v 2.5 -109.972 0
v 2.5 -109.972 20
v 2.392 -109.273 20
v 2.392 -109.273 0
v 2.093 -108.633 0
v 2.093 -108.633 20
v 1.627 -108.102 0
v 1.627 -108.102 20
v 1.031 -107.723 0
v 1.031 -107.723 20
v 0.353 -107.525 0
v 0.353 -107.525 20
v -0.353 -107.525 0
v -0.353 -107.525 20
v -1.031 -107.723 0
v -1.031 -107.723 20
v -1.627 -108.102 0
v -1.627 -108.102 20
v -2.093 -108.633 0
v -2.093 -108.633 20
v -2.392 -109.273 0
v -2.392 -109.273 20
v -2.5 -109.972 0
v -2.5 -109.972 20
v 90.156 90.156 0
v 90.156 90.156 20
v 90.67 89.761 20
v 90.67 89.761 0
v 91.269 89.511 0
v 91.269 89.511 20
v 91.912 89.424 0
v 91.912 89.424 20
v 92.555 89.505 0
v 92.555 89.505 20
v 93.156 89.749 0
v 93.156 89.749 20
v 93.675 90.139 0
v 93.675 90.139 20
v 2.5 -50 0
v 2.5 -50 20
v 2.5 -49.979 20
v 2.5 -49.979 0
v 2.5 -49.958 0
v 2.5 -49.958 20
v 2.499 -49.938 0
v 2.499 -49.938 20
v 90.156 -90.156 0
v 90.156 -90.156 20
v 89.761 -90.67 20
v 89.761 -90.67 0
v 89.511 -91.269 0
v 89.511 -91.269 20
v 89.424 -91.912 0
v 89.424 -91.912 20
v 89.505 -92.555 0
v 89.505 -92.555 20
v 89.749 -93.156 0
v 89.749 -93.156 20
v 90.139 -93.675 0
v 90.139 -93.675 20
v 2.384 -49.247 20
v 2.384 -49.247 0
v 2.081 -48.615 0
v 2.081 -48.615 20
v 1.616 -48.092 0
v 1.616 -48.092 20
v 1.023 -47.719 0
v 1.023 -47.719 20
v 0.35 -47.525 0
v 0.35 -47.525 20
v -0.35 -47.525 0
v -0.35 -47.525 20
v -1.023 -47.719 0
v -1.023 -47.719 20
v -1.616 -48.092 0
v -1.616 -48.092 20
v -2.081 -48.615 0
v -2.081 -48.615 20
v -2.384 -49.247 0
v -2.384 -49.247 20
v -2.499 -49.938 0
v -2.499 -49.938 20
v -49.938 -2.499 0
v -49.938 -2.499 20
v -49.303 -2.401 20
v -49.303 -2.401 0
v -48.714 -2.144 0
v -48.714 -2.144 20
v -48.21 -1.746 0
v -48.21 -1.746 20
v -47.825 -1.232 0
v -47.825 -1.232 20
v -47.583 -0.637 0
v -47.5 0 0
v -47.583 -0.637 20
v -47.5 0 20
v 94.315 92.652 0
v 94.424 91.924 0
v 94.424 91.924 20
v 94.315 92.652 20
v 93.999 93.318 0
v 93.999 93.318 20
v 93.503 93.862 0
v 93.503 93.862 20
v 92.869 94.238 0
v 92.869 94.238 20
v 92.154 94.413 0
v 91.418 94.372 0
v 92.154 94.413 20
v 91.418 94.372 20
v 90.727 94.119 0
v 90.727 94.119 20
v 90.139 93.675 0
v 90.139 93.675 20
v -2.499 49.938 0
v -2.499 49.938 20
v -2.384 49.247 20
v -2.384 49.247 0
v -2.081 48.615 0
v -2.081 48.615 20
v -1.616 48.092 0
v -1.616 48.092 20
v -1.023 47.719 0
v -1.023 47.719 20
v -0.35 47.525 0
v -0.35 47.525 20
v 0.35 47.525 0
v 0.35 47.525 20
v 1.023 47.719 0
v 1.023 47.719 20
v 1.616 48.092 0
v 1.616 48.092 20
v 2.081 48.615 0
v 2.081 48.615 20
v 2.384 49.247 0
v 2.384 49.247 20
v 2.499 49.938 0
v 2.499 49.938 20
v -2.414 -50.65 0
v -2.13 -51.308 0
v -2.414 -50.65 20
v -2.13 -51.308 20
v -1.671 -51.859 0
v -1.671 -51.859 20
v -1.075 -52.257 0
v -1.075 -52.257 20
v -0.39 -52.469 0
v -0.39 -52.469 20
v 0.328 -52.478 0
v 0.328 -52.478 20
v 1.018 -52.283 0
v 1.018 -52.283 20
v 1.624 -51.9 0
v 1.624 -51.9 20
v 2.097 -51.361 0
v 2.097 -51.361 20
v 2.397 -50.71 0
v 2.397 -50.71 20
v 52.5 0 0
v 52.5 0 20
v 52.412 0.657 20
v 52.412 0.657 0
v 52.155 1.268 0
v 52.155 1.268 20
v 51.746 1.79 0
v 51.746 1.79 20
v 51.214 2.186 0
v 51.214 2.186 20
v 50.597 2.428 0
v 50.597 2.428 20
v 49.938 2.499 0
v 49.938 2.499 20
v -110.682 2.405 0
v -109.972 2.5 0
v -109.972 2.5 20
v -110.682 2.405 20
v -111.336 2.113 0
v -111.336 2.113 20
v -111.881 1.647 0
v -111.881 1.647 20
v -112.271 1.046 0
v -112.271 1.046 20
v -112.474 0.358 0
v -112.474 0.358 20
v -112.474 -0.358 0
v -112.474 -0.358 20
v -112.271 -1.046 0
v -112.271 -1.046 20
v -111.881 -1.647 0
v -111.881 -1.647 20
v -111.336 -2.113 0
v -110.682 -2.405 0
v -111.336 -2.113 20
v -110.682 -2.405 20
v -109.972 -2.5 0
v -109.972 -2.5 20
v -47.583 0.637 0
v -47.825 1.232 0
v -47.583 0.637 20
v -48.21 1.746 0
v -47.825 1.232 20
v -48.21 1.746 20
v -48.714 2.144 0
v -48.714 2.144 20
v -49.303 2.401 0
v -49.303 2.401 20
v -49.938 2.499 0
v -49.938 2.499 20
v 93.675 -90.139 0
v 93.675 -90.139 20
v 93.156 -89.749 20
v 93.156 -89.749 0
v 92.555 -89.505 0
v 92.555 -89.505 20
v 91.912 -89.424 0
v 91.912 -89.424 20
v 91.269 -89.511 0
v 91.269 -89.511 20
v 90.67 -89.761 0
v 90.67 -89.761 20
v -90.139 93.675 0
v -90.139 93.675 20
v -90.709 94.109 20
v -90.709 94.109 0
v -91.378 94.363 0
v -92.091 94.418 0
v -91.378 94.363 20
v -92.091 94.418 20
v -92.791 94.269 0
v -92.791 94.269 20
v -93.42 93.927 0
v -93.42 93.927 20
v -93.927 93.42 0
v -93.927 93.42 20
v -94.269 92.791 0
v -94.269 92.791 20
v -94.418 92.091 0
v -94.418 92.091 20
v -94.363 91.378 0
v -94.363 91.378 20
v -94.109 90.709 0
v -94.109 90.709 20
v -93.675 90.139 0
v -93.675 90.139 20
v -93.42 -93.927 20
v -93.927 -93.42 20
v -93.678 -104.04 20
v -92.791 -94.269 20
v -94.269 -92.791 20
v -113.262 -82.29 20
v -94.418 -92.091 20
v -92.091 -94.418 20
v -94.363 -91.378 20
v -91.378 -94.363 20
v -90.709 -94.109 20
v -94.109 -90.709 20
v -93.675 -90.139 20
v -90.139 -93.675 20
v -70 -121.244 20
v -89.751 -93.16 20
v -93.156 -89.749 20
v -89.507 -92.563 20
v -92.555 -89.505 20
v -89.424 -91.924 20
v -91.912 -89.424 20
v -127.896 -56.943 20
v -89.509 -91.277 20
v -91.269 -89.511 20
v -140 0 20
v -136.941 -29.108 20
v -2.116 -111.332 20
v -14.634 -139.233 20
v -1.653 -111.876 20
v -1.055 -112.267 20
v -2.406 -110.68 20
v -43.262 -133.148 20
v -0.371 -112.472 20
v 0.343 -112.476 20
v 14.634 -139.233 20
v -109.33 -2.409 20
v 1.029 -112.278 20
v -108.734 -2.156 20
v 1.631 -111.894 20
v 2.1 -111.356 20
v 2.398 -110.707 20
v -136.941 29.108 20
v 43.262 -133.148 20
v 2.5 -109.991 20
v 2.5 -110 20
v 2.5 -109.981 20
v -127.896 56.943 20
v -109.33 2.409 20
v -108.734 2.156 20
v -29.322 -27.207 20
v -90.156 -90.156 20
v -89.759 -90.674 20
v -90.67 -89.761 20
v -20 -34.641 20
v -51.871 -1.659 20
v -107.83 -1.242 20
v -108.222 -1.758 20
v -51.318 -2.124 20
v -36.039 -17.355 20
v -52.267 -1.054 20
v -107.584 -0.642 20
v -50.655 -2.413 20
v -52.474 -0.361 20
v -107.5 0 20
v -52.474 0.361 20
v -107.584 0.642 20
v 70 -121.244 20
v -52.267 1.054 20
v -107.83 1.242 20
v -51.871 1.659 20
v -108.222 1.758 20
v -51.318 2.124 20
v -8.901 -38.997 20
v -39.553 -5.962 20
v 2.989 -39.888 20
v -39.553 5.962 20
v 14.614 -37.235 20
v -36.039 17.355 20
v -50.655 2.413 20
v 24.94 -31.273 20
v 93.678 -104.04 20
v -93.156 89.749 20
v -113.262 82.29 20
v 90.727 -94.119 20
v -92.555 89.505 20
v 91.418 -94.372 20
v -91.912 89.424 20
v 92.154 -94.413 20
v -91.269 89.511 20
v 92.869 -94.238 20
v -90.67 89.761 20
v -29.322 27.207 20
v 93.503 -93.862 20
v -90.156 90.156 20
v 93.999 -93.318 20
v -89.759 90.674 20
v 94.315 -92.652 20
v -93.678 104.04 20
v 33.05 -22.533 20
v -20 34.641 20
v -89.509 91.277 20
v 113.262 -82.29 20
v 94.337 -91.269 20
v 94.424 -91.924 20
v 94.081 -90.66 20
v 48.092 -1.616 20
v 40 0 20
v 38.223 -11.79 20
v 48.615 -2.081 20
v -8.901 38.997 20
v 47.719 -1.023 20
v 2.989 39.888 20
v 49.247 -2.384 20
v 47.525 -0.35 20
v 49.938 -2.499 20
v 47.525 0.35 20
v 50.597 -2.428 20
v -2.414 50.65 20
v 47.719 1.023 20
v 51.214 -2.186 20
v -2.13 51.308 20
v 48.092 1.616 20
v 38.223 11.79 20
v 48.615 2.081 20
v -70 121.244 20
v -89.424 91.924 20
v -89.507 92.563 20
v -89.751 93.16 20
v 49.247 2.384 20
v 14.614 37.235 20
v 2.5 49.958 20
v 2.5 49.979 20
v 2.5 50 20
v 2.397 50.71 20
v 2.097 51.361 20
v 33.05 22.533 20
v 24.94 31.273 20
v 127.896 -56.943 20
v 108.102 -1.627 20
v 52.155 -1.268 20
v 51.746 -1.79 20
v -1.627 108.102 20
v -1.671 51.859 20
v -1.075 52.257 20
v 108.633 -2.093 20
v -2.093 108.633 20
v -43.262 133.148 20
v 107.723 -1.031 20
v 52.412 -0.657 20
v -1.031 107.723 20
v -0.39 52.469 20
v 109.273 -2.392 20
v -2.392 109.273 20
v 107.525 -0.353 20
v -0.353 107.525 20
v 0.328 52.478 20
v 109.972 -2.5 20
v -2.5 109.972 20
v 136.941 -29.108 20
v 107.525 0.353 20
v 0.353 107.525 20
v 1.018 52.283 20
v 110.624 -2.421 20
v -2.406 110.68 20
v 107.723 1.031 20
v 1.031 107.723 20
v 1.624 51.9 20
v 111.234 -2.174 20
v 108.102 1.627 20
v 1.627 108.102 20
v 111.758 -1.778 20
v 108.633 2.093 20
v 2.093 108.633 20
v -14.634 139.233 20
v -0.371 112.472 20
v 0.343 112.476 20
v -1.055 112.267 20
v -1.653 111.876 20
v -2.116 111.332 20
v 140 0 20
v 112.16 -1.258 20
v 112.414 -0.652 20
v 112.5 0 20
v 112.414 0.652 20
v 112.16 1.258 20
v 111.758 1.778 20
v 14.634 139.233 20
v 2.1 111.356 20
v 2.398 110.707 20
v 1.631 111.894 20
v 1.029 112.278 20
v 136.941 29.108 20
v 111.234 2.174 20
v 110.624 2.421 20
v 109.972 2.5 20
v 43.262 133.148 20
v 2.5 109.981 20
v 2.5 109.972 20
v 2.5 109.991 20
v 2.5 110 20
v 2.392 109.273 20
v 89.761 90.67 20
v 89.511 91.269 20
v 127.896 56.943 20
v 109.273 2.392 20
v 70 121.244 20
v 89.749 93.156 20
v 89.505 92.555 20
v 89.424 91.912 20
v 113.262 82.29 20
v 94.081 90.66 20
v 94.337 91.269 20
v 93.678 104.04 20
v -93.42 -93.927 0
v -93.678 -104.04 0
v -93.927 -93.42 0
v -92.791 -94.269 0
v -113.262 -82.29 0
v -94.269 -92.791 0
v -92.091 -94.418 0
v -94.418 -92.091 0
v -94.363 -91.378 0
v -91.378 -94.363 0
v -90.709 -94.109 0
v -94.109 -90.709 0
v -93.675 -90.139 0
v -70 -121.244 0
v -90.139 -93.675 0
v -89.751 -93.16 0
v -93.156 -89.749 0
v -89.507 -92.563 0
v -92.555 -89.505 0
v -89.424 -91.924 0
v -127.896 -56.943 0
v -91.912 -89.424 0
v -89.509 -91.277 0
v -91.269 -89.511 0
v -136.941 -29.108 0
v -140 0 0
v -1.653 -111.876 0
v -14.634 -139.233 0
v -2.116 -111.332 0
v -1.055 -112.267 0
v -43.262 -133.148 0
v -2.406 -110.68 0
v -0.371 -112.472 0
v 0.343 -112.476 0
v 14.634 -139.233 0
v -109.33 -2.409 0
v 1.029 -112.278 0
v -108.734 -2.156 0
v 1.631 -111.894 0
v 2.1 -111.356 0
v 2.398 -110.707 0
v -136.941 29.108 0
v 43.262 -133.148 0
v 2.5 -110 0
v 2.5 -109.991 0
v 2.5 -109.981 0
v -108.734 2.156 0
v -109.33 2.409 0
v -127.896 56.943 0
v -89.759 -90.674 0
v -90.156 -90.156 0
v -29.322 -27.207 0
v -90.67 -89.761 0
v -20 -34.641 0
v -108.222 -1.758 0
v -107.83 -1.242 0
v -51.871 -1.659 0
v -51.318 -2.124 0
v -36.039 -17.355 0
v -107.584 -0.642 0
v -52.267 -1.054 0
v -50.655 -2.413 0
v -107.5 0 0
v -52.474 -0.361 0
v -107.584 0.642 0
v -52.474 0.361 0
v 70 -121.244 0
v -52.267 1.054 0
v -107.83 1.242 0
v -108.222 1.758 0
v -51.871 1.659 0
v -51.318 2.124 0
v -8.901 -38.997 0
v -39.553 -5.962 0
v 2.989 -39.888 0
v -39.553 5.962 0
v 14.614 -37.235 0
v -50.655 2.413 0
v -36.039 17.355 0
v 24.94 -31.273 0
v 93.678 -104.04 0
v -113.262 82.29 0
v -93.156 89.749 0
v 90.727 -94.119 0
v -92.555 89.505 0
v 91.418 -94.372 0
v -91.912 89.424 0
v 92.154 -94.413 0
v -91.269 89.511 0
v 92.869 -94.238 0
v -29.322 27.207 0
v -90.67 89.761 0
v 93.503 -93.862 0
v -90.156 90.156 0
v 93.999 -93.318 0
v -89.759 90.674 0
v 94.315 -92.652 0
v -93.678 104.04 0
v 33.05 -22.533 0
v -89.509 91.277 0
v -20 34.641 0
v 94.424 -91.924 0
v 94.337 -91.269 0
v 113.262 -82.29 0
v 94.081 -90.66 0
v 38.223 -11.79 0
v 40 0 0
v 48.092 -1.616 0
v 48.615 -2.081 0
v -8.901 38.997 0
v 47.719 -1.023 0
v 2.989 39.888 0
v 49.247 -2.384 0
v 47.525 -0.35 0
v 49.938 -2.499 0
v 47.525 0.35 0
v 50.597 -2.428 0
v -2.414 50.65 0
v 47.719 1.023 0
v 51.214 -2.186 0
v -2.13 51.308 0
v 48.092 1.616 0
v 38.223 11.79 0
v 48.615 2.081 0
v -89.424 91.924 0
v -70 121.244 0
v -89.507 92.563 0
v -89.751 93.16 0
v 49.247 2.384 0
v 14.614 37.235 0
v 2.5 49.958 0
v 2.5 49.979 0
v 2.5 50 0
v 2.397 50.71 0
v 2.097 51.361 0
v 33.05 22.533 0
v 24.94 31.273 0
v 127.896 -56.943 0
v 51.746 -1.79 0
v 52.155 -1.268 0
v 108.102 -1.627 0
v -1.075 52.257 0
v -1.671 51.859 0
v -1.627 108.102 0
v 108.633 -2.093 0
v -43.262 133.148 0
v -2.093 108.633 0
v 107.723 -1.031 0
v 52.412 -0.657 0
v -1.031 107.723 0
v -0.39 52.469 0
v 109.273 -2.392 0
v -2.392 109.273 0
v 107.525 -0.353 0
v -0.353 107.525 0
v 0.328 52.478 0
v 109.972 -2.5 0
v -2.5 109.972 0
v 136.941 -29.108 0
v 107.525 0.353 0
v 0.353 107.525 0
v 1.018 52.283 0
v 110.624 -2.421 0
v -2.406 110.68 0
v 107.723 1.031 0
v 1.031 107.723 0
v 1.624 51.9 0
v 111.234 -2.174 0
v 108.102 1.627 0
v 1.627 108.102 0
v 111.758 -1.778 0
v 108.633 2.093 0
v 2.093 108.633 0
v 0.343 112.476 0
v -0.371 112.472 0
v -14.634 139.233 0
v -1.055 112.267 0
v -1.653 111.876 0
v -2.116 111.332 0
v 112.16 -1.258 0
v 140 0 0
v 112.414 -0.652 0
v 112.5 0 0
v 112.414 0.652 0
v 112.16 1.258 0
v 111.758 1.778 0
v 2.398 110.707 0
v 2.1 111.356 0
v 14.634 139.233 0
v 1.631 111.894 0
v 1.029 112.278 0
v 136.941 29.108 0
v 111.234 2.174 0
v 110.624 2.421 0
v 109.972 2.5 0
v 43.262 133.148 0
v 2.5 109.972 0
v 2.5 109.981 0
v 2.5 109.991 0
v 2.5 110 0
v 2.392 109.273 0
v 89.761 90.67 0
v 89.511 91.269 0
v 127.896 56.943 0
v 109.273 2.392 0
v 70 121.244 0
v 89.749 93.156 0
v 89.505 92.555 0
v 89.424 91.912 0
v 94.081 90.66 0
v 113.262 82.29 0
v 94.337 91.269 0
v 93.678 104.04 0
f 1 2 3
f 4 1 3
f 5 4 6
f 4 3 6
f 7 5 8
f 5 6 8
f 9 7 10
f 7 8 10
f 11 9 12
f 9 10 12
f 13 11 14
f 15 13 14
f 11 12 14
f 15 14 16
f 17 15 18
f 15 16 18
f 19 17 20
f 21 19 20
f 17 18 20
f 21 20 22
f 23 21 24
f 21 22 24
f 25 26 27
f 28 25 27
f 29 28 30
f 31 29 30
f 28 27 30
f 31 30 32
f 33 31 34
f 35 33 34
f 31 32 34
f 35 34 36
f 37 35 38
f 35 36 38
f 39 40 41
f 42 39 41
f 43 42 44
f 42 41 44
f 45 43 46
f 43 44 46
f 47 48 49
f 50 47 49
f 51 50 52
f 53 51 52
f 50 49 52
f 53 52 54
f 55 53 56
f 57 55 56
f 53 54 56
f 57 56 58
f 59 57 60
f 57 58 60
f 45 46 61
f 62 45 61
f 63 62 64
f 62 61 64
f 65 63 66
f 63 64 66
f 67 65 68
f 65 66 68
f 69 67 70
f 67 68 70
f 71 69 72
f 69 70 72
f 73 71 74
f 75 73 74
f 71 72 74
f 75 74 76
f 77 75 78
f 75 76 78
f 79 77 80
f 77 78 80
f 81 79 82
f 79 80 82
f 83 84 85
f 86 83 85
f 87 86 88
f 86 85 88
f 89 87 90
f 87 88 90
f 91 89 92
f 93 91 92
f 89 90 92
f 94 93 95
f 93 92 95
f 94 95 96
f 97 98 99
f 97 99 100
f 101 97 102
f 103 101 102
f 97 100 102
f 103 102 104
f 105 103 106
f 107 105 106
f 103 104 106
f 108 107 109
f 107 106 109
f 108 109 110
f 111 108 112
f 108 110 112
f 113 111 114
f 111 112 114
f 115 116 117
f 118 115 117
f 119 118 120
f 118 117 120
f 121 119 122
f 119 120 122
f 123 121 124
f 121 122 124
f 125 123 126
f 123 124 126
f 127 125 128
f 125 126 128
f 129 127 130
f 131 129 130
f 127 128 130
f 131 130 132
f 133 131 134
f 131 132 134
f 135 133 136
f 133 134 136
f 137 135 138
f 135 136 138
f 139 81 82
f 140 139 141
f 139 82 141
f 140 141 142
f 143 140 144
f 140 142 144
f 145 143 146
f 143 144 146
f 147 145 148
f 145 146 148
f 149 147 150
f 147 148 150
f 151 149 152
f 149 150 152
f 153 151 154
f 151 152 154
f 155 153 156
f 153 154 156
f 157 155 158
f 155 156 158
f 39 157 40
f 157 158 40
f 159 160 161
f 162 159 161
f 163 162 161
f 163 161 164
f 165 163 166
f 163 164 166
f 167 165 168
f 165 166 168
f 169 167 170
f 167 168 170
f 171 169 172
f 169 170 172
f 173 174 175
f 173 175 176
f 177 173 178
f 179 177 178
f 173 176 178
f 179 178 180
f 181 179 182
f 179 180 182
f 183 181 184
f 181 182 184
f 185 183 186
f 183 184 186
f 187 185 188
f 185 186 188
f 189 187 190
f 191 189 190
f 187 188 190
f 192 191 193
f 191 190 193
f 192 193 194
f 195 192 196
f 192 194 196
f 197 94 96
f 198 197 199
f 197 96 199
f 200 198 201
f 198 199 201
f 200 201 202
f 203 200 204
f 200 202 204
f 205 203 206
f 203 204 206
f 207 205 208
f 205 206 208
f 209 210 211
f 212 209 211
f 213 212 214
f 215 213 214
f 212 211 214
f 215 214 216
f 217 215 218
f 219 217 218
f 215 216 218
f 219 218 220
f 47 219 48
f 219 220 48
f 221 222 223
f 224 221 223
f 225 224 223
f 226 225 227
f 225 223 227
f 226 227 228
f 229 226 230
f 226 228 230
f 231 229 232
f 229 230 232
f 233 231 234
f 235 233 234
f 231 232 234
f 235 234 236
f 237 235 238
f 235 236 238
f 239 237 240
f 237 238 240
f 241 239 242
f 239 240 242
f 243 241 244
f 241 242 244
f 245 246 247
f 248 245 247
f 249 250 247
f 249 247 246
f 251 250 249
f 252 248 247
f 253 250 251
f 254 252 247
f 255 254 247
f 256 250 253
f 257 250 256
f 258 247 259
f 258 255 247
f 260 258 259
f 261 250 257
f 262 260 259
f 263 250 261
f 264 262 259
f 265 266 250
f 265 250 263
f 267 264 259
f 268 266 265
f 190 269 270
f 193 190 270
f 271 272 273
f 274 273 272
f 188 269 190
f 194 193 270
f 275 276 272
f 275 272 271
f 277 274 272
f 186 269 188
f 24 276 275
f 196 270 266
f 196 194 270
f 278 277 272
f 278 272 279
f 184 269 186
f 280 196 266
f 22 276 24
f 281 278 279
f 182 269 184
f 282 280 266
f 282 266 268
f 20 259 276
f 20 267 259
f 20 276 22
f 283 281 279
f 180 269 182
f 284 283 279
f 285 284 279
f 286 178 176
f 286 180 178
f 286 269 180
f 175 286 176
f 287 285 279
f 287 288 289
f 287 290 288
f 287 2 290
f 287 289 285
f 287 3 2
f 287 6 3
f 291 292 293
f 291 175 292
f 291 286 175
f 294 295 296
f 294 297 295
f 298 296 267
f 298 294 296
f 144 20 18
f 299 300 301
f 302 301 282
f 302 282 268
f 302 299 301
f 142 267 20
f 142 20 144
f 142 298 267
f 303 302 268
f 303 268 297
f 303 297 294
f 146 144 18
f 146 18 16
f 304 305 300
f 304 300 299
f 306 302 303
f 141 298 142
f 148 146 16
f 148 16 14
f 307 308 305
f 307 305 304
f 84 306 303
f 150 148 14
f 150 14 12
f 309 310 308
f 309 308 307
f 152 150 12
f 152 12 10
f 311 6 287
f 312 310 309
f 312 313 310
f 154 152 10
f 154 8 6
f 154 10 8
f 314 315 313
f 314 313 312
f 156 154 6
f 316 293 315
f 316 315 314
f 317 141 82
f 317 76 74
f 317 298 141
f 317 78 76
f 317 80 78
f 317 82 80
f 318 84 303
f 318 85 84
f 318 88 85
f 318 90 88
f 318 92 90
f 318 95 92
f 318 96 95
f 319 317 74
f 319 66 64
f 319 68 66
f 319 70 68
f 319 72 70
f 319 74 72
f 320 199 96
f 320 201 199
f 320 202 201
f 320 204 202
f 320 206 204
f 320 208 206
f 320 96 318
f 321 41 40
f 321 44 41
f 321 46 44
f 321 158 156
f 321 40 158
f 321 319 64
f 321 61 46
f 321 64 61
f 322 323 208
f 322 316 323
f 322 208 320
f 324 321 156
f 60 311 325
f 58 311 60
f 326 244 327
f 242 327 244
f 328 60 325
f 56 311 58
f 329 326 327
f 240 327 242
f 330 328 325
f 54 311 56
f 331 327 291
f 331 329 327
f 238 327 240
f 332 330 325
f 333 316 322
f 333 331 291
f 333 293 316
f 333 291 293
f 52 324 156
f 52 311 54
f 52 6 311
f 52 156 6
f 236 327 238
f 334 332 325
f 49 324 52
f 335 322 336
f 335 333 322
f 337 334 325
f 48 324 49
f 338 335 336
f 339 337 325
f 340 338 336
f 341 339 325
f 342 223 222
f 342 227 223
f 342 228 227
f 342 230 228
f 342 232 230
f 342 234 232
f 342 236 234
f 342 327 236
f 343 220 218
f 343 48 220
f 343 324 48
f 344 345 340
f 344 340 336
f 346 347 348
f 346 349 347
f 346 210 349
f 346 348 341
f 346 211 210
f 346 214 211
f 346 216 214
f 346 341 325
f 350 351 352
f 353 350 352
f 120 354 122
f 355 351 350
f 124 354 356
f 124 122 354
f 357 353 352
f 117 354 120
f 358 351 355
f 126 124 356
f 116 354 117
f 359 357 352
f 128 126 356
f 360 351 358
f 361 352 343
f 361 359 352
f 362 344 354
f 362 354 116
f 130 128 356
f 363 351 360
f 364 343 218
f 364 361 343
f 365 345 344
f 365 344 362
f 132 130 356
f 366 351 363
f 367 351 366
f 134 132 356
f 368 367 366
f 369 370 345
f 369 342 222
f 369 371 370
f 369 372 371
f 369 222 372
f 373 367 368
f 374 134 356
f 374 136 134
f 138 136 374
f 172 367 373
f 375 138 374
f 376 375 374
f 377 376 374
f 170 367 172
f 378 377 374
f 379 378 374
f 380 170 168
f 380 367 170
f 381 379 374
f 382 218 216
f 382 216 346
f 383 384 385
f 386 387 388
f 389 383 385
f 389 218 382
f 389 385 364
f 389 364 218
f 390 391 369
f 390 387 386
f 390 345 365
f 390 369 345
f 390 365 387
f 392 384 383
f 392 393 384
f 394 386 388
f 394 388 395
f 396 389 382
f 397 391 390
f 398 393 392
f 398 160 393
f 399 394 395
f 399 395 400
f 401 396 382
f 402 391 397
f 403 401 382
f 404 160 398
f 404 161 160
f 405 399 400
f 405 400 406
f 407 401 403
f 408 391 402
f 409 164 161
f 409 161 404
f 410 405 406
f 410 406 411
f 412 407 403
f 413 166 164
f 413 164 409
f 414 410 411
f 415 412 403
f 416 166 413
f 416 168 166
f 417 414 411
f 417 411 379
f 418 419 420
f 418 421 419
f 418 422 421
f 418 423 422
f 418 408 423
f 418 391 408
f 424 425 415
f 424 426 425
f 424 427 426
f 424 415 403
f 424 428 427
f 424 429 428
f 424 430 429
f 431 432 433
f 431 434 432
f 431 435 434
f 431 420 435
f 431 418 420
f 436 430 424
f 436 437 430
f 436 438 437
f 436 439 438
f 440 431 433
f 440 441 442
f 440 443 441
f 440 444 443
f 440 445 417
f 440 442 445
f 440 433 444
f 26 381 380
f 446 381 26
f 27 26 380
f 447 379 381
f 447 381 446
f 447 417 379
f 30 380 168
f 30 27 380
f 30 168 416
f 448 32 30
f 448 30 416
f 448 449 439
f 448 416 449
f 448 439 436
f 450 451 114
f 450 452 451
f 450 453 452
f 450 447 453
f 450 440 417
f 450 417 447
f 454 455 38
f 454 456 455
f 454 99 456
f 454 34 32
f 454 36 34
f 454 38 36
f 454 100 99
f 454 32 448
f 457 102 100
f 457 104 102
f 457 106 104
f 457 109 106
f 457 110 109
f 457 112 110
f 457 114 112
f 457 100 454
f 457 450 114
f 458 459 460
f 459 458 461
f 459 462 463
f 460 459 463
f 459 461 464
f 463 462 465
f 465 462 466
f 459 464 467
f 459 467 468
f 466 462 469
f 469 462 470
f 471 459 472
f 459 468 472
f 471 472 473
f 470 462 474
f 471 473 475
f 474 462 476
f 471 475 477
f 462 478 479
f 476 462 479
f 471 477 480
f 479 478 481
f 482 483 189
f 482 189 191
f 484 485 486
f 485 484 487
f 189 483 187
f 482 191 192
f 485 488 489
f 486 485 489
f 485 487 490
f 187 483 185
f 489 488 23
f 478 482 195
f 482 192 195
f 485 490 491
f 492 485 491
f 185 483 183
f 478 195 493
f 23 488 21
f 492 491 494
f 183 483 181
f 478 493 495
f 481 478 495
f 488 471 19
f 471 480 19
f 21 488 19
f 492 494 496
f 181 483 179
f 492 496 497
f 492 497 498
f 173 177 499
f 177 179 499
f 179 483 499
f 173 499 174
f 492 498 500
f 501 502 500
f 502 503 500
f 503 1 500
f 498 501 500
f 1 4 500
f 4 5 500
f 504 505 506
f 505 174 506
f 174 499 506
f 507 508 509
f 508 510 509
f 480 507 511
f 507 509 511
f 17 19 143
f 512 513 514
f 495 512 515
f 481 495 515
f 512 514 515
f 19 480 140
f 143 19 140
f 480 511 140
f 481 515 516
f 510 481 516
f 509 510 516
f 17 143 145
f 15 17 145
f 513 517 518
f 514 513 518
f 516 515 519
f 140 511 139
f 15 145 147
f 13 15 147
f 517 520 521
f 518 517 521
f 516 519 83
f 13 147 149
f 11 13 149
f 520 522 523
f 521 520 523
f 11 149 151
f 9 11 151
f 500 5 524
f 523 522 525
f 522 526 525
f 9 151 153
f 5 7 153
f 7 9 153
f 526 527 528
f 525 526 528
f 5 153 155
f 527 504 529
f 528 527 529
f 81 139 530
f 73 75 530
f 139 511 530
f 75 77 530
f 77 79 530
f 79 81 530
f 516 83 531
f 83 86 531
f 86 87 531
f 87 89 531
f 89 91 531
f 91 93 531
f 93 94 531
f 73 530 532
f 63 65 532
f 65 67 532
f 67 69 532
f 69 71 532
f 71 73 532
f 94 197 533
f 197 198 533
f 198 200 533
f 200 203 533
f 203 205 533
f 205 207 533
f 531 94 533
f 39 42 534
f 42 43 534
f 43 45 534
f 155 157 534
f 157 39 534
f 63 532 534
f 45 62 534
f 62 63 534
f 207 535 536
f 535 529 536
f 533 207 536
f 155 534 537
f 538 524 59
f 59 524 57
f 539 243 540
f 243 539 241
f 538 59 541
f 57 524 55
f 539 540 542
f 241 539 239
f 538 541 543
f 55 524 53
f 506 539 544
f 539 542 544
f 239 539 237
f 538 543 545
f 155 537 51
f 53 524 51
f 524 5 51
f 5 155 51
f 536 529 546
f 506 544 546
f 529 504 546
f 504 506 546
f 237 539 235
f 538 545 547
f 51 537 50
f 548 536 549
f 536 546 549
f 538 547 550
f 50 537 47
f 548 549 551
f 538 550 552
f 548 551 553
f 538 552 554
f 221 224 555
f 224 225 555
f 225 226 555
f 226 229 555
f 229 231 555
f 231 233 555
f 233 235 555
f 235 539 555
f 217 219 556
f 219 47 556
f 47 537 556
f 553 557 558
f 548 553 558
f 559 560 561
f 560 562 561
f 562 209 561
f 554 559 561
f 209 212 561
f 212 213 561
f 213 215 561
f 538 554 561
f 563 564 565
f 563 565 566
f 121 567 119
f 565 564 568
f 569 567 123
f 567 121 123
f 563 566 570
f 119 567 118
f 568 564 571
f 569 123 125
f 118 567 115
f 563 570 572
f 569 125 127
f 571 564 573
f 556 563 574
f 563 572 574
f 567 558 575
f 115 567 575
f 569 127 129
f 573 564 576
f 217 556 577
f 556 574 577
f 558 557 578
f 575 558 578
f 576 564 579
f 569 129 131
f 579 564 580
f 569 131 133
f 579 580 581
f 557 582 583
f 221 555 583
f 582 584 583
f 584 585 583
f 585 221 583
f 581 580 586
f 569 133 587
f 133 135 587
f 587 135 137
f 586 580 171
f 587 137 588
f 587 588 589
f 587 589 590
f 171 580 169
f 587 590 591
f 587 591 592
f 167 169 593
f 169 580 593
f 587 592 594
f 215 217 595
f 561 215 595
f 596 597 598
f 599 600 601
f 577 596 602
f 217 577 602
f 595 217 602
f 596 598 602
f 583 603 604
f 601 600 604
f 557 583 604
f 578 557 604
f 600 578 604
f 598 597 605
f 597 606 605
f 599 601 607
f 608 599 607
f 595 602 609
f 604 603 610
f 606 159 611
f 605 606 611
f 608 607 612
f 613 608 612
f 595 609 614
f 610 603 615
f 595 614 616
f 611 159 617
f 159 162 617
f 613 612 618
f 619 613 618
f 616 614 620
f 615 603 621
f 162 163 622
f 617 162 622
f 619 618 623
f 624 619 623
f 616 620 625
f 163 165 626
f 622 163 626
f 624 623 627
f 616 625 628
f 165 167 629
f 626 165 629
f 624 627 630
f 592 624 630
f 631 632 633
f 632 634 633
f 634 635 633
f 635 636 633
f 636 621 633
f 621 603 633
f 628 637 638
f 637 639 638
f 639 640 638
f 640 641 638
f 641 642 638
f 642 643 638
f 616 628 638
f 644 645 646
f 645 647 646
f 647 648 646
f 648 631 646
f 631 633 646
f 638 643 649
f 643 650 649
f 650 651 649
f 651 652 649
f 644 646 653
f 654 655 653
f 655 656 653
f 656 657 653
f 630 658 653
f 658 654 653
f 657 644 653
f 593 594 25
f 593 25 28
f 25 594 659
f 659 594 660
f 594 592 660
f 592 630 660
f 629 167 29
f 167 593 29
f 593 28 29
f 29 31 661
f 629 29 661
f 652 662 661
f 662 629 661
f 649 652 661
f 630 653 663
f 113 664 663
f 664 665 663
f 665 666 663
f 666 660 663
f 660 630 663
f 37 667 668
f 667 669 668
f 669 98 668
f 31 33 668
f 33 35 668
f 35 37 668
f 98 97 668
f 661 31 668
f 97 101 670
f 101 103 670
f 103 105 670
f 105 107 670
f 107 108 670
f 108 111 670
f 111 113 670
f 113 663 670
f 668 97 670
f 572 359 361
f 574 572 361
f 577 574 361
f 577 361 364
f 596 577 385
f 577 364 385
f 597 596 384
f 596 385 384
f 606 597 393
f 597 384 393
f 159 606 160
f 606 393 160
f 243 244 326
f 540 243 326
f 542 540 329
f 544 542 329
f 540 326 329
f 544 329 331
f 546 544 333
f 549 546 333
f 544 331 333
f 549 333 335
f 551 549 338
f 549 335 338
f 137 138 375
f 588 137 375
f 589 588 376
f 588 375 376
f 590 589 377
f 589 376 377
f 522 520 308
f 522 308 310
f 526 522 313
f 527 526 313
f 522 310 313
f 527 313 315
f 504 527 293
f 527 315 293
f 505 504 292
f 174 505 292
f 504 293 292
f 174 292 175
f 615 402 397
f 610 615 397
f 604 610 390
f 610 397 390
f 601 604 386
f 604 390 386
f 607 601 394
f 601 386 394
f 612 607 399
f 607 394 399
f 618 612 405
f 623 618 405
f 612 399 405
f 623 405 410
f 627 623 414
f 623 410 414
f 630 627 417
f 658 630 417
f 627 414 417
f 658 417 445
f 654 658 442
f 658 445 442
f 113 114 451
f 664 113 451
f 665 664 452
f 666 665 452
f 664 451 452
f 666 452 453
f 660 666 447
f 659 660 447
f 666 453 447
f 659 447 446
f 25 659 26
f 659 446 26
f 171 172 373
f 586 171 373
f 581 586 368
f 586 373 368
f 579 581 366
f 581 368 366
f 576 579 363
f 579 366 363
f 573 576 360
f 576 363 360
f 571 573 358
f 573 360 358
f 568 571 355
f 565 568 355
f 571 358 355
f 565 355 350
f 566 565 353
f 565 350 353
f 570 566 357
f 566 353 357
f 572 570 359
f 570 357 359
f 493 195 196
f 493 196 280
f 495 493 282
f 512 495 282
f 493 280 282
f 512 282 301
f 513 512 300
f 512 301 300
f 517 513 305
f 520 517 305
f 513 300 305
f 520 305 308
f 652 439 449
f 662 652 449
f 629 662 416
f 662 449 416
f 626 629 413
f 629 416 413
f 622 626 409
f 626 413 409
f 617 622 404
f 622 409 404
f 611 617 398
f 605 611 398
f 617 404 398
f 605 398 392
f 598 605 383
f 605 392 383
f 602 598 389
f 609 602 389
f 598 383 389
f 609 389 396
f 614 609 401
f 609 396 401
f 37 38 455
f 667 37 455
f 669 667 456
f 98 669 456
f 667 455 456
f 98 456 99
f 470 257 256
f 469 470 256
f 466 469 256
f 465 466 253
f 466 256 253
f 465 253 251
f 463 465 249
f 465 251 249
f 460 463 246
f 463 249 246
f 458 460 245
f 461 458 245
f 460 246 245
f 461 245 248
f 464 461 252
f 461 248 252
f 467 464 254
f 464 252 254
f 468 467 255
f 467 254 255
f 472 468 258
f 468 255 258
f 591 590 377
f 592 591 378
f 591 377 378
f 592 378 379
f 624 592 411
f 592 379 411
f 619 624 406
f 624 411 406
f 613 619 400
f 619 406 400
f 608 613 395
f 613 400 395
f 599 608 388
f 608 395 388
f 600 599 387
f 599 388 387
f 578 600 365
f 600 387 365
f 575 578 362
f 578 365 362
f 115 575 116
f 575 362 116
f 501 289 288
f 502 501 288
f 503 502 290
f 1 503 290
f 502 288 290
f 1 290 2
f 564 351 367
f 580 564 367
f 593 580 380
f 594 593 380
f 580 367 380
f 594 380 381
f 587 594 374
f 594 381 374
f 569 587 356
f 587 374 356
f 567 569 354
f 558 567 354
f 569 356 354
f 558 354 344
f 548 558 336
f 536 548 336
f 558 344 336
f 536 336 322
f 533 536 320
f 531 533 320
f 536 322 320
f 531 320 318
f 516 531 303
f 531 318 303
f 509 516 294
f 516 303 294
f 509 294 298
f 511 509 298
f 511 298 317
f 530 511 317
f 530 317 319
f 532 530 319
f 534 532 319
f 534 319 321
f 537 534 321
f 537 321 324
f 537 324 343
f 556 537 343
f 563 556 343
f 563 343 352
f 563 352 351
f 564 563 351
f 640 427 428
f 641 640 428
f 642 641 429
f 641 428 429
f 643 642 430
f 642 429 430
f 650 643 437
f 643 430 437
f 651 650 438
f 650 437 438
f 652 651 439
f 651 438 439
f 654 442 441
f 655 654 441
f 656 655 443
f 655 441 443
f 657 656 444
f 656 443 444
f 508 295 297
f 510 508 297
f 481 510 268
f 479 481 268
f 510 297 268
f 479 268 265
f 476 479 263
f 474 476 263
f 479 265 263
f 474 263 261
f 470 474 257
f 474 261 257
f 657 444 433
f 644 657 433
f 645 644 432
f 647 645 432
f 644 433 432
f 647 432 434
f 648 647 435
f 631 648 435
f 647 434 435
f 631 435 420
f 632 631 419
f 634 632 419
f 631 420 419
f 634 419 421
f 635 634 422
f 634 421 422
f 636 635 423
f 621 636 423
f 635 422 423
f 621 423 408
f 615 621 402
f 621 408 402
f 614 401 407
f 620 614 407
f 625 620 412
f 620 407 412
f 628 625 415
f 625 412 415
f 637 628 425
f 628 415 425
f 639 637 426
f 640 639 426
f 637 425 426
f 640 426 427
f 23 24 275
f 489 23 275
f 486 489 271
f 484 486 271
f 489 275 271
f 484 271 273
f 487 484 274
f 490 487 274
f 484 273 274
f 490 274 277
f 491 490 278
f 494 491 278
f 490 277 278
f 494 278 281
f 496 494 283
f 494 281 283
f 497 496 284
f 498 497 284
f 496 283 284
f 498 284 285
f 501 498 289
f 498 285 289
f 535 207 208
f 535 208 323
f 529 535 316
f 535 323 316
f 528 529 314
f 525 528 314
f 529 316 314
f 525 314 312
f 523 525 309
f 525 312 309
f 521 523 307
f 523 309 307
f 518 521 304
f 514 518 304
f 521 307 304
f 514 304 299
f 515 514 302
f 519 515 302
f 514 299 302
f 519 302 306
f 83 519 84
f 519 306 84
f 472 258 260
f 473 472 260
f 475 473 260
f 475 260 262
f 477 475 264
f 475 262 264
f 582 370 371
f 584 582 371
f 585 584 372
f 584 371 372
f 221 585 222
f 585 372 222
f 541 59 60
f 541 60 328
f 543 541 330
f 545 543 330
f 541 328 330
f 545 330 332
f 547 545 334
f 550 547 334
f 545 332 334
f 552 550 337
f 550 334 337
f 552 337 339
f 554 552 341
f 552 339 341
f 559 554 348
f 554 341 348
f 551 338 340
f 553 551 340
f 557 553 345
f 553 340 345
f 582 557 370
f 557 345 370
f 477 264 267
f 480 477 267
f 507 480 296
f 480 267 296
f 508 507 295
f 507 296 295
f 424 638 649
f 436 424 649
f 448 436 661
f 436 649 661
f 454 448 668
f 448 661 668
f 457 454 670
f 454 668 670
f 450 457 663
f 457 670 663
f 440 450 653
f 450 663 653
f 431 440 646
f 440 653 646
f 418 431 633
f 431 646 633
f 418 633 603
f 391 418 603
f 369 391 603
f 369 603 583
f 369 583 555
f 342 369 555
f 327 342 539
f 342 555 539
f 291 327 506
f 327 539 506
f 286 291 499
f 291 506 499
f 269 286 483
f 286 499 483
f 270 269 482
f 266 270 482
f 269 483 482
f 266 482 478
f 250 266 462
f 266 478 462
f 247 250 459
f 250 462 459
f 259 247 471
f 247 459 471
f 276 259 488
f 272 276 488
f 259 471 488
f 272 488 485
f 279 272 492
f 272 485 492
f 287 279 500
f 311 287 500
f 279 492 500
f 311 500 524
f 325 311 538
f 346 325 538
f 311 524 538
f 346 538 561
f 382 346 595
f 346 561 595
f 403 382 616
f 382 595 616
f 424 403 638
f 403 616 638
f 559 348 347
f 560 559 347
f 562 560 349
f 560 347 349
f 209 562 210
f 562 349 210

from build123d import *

# Parameters (mm, degrees)
F0_R     = 140
F1_DEPTH = 20
F3_DEPTH = 20.001
F5_DEPTH = 25
F6_R     = 40
F7_DEPTH = 25
F9_DEPTH = 25


with BuildPart() as f1:
    # F0 (on Top) → F1 (new body)
    with BuildSketch(Plane.XY):
        Circle(F0_R)
    extrude(amount=F1_DEPTH)

    # F2 (on face) → F3 (cut, through all)
    with BuildSketch(Plane.XY.offset(20)):
        with BuildLine():
            ThreePointArc((-2.4998385795, 109.9715909091), (0, 110), (2.4998385795, 109.9715909091))
            ThreePointArc((2.4998385795, 109.9715909091), (2.4999596445, 109.9857952252), (2.5, 110))
            ThreePointArc((2.5, 110), (-0.0142047748, 112.4999596445), (-2.4998385795, 109.9715909091))
        make_face()
        with BuildLine():
            ThreePointArc((-2.4998385795, 109.9715909091), (0, 107.5), (2.4998385795, 109.9715909091))
            ThreePointArc((2.4998385795, 109.9715909091), (0, 110), (-2.4998385795, 109.9715909091))
        make_face()
        with BuildLine():
            ThreePointArc((109.9715909091, 2.4998385795), (109.992897498, 1.25), (110, 0))
            ThreePointArc((110, 0), (109.992897498, -1.25), (109.9715909091, -2.4998385795))
            ThreePointArc((109.9715909091, -2.4998385795), (111.7576941248, -1.7777827099), (112.5, 0))
            ThreePointArc((112.5, 0), (111.7576941248, 1.7777827099), (109.9715909091, 2.4998385795))
        make_face()
        with BuildLine():
            ThreePointArc((109.9715909091, -2.4998385795), (109.992897498, -1.25), (110, 0))
            ThreePointArc((110, 0), (109.992897498, 1.25), (109.9715909091, 2.4998385795))
            ThreePointArc((109.9715909091, 2.4998385795), (107.5, 0), (109.9715909091, -2.4998385795))
        make_face()
        with BuildLine():
            ThreePointArc((2.5, -110), (2.4999596445, -109.9857952252), (2.4998385795, -109.9715909091))
            ThreePointArc((2.4998385795, -109.9715909091), (0, -110), (-2.4998385795, -109.9715909091))
            ThreePointArc((-2.4998385795, -109.9715909091), (-0.0142047748, -112.4999596445), (2.5, -110))
        make_face()
        with BuildLine():
            ThreePointArc((-2.4998385795, -109.9715909091), (0, -110), (2.4998385795, -109.9715909091))
            ThreePointArc((2.4998385795, -109.9715909091), (0, -107.5), (-2.4998385795, -109.9715909091))
        make_face()
        with BuildLine():
            ThreePointArc((-107.5, 0), (-108.2222172901, 1.7576941248), (-109.9715909091, 2.4998385795))
            ThreePointArc((-109.9715909091, 2.4998385795), (-110, 0), (-109.9715909091, -2.4998385795))
            ThreePointArc((-109.9715909091, -2.4998385795), (-108.2222172901, -1.7576941248), (-107.5, 0))
        make_face()
        with BuildLine():
            ThreePointArc((-109.9715909091, -2.4998385795), (-110, 0), (-109.9715909091, 2.4998385795))
            ThreePointArc((-109.9715909091, 2.4998385795), (-112.5, 0), (-109.9715909091, -2.4998385795))
        make_face()
    extrude(amount=-F3_DEPTH, mode=Mode.SUBTRACT)

    # F4 (on face) → F5 (cut)
    with BuildSketch(Plane.XY.offset(20)):
        with BuildLine():
            ThreePointArc((-89.4238815543, 91.9238815543), (-89.6096098032, 92.8694746286), (-90.139198564, 93.6745690262))
            ThreePointArc((-90.139198564, 93.6745690262), (-91.0357485398, 92.8035154927), (-91.9238815543, 91.9238815543))
            Line((-91.9238815543, 91.9238815543), (-90.1561146013, 90.1561146013))
            ThreePointArc((-90.1561146013, 90.1561146013), (-89.614182723, 90.9671729733), (-89.4238815543, 91.9238815543))
        make_face()
        with BuildLine():
            ThreePointArc((-93.6745690262, 90.139198564), (-91.9118621846, 89.4239104475), (-90.1561146013, 90.1561146013))
            Line((-90.1561146013, 90.1561146013), (-91.9238815543, 91.9238815543))
            ThreePointArc((-91.9238815543, 91.9238815543), (-92.8035154927, 91.0357485398), (-93.6745690262, 90.139198564))
        make_face()
        with BuildLine():
            ThreePointArc((-91.9238815543, 91.9238815543), (-91.0357485398, 92.8035154927), (-90.139198564, 93.6745690262))
            ThreePointArc((-90.139198564, 93.6745690262), (-93.6916485072, 93.6916485072), (-93.6745690262, 90.139198564))
            ThreePointArc((-93.6745690262, 90.139198564), (-92.8035154927, 91.0357485398), (-91.9238815543, 91.9238815543))
        make_face()
        with BuildLine():
            ThreePointArc((91.9238815543, 91.9238815543), (92.8035154927, 91.0357485398), (93.6745690262, 90.139198564))
            ThreePointArc((93.6745690262, 90.139198564), (94.228954078, 90.9560795807), (94.4238815543, 91.9238815543))
            ThreePointArc((94.4238815543, 91.9238815543), (92.8694746286, 94.2381533053), (90.139198564, 93.6745690262))
            ThreePointArc((90.139198564, 93.6745690262), (91.0357485398, 92.8035154927), (91.9238815543, 91.9238815543))
        make_face()
        with BuildLine():
            ThreePointArc((90.1561146013, 90.1561146013), (91.9118621846, 89.4239104475), (93.6745690262, 90.139198564))
            ThreePointArc((93.6745690262, 90.139198564), (92.8035154927, 91.0357485398), (91.9238815543, 91.9238815543))
            Line((91.9238815543, 91.9238815543), (90.1561146013, 90.1561146013))
        make_face()
        with BuildLine():
            Line((90.1561146013, 90.1561146013), (91.9238815543, 91.9238815543))
            ThreePointArc((91.9238815543, 91.9238815543), (91.0357485398, 92.8035154927), (90.139198564, 93.6745690262))
            ThreePointArc((90.139198564, 93.6745690262), (89.4239104475, 91.9118621846), (90.1561146013, 90.1561146013))
        make_face()
        with BuildLine():
            ThreePointArc((94.4238815543, -91.9238815543), (94.228954078, -90.9560795807), (93.6745690262, -90.139198564))
            ThreePointArc((93.6745690262, -90.139198564), (92.8035154927, -91.0357485398), (91.9238815543, -91.9238815543))
            ThreePointArc((91.9238815543, -91.9238815543), (91.0357485398, -92.8035154927), (90.139198564, -93.6745690262))
            ThreePointArc((90.139198564, -93.6745690262), (92.8694746286, -94.2381533053), (94.4238815543, -91.9238815543))
        make_face()
        with BuildLine():
            ThreePointArc((91.9238815543, -91.9238815543), (92.8035154927, -91.0357485398), (93.6745690262, -90.139198564))
            ThreePointArc((93.6745690262, -90.139198564), (91.9118621846, -89.4239104475), (90.1561146013, -90.1561146013))
            Line((90.1561146013, -90.1561146013), (91.9238815543, -91.9238815543))
        make_face()
        with BuildLine():
            ThreePointArc((90.139198564, -93.6745690262), (91.0357485398, -92.8035154927), (91.9238815543, -91.9238815543))
            Line((91.9238815543, -91.9238815543), (90.1561146013, -90.1561146013))
            ThreePointArc((90.1561146013, -90.1561146013), (89.4239104475, -91.9118621846), (90.139198564, -93.6745690262))
        make_face()
        with BuildLine():
            ThreePointArc((-89.4238815543, -91.9238815543), (-89.614182723, -90.9671729733), (-90.1561146013, -90.1561146013))
            Line((-90.1561146013, -90.1561146013), (-91.9238815543, -91.9238815543))
            ThreePointArc((-91.9238815543, -91.9238815543), (-91.0357485398, -92.8035154927), (-90.139198564, -93.6745690262))
            ThreePointArc((-90.139198564, -93.6745690262), (-89.6096098032, -92.8694746286), (-89.4238815543, -91.9238815543))
        make_face()
        with BuildLine():
            ThreePointArc((-93.6745690262, -90.139198564), (-93.6916485072, -93.6916485072), (-90.139198564, -93.6745690262))
            ThreePointArc((-90.139198564, -93.6745690262), (-91.0357485398, -92.8035154927), (-91.9238815543, -91.9238815543))
            ThreePointArc((-91.9238815543, -91.9238815543), (-92.8035154927, -91.0357485398), (-93.6745690262, -90.139198564))
        make_face()
        with BuildLine():
            Line((-91.9238815543, -91.9238815543), (-90.1561146013, -90.1561146013))
            ThreePointArc((-90.1561146013, -90.1561146013), (-91.9118621846, -89.4239104475), (-93.6745690262, -90.139198564))
            ThreePointArc((-93.6745690262, -90.139198564), (-92.8035154927, -91.0357485398), (-91.9238815543, -91.9238815543))
        make_face()
    extrude(amount=-F5_DEPTH, mode=Mode.SUBTRACT)

    # F6 (on face) → F7 (cut)
    with BuildSketch(Plane.XY.offset(20)):
        Circle(F6_R)
    extrude(amount=-F7_DEPTH, mode=Mode.SUBTRACT)

    # F8 (on face) → F9 (cut)
    with BuildSketch(Plane.XY.offset(20)):
        with BuildLine():
            ThreePointArc((-2.4992186279, 49.9375), (0, 50), (2.4992186279, 49.9375))
            ThreePointArc((2.4992186279, 49.9375), (2.4998046493, 49.9687475579), (2.5, 50))
            ThreePointArc((2.5, 50), (-0.0312524421, 52.4998046493), (-2.4992186279, 49.9375))
        make_face()
        with BuildLine():
            ThreePointArc((-2.4992186279, 49.9375), (0, 47.5), (2.4992186279, 49.9375))
            ThreePointArc((2.4992186279, 49.9375), (0, 50), (-2.4992186279, 49.9375))
        make_face()
        with BuildLine():
            ThreePointArc((-47.5, 0), (-48.2102723671, 1.7455300055), (-49.9375, 2.4992186279))
            ThreePointArc((-49.9375, 2.4992186279), (-50, 0), (-49.9375, -2.4992186279))
            ThreePointArc((-49.9375, -2.4992186279), (-48.2102723671, -1.7455300055), (-47.5, 0))
        make_face()
        with BuildLine():
            ThreePointArc((-49.9375, -2.4992186279), (-50, 0), (-49.9375, 2.4992186279))
            ThreePointArc((-49.9375, 2.4992186279), (-52.5, 0), (-49.9375, -2.4992186279))
        make_face()
        with BuildLine():
            ThreePointArc((2.5, -50), (2.4998046493, -49.9687475579), (2.4992186279, -49.9375))
            ThreePointArc((2.4992186279, -49.9375), (0, -50), (-2.4992186279, -49.9375))
            ThreePointArc((-2.4992186279, -49.9375), (-0.0312524421, -52.4998046493), (2.5, -50))
        make_face()
        with BuildLine():
            ThreePointArc((-2.4992186279, -49.9375), (0, -50), (2.4992186279, -49.9375))
            ThreePointArc((2.4992186279, -49.9375), (0, -47.5), (-2.4992186279, -49.9375))
        make_face()
        with BuildLine():
            ThreePointArc((49.9375, 2.4992186279), (49.9843725578, 1.25), (50, 0))
            ThreePointArc((50, 0), (49.9843725578, -1.25), (49.9375, -2.4992186279))
            ThreePointArc((49.9375, -2.4992186279), (51.7455300055, -1.7897276329), (52.5, 0))
            ThreePointArc((52.5, 0), (51.7455300055, 1.7897276329), (49.9375, 2.4992186279))
        make_face()
        with BuildLine():
            ThreePointArc((49.9375, -2.4992186279), (49.9843725578, -1.25), (50, 0))
            ThreePointArc((50, 0), (49.9843725578, 1.25), (49.9375, 2.4992186279))
            ThreePointArc((49.9375, 2.4992186279), (47.5, 0), (49.9375, -2.4992186279))
        make_face()
    extrude(amount=-F9_DEPTH, mode=Mode.SUBTRACT)


solid = f1.part
